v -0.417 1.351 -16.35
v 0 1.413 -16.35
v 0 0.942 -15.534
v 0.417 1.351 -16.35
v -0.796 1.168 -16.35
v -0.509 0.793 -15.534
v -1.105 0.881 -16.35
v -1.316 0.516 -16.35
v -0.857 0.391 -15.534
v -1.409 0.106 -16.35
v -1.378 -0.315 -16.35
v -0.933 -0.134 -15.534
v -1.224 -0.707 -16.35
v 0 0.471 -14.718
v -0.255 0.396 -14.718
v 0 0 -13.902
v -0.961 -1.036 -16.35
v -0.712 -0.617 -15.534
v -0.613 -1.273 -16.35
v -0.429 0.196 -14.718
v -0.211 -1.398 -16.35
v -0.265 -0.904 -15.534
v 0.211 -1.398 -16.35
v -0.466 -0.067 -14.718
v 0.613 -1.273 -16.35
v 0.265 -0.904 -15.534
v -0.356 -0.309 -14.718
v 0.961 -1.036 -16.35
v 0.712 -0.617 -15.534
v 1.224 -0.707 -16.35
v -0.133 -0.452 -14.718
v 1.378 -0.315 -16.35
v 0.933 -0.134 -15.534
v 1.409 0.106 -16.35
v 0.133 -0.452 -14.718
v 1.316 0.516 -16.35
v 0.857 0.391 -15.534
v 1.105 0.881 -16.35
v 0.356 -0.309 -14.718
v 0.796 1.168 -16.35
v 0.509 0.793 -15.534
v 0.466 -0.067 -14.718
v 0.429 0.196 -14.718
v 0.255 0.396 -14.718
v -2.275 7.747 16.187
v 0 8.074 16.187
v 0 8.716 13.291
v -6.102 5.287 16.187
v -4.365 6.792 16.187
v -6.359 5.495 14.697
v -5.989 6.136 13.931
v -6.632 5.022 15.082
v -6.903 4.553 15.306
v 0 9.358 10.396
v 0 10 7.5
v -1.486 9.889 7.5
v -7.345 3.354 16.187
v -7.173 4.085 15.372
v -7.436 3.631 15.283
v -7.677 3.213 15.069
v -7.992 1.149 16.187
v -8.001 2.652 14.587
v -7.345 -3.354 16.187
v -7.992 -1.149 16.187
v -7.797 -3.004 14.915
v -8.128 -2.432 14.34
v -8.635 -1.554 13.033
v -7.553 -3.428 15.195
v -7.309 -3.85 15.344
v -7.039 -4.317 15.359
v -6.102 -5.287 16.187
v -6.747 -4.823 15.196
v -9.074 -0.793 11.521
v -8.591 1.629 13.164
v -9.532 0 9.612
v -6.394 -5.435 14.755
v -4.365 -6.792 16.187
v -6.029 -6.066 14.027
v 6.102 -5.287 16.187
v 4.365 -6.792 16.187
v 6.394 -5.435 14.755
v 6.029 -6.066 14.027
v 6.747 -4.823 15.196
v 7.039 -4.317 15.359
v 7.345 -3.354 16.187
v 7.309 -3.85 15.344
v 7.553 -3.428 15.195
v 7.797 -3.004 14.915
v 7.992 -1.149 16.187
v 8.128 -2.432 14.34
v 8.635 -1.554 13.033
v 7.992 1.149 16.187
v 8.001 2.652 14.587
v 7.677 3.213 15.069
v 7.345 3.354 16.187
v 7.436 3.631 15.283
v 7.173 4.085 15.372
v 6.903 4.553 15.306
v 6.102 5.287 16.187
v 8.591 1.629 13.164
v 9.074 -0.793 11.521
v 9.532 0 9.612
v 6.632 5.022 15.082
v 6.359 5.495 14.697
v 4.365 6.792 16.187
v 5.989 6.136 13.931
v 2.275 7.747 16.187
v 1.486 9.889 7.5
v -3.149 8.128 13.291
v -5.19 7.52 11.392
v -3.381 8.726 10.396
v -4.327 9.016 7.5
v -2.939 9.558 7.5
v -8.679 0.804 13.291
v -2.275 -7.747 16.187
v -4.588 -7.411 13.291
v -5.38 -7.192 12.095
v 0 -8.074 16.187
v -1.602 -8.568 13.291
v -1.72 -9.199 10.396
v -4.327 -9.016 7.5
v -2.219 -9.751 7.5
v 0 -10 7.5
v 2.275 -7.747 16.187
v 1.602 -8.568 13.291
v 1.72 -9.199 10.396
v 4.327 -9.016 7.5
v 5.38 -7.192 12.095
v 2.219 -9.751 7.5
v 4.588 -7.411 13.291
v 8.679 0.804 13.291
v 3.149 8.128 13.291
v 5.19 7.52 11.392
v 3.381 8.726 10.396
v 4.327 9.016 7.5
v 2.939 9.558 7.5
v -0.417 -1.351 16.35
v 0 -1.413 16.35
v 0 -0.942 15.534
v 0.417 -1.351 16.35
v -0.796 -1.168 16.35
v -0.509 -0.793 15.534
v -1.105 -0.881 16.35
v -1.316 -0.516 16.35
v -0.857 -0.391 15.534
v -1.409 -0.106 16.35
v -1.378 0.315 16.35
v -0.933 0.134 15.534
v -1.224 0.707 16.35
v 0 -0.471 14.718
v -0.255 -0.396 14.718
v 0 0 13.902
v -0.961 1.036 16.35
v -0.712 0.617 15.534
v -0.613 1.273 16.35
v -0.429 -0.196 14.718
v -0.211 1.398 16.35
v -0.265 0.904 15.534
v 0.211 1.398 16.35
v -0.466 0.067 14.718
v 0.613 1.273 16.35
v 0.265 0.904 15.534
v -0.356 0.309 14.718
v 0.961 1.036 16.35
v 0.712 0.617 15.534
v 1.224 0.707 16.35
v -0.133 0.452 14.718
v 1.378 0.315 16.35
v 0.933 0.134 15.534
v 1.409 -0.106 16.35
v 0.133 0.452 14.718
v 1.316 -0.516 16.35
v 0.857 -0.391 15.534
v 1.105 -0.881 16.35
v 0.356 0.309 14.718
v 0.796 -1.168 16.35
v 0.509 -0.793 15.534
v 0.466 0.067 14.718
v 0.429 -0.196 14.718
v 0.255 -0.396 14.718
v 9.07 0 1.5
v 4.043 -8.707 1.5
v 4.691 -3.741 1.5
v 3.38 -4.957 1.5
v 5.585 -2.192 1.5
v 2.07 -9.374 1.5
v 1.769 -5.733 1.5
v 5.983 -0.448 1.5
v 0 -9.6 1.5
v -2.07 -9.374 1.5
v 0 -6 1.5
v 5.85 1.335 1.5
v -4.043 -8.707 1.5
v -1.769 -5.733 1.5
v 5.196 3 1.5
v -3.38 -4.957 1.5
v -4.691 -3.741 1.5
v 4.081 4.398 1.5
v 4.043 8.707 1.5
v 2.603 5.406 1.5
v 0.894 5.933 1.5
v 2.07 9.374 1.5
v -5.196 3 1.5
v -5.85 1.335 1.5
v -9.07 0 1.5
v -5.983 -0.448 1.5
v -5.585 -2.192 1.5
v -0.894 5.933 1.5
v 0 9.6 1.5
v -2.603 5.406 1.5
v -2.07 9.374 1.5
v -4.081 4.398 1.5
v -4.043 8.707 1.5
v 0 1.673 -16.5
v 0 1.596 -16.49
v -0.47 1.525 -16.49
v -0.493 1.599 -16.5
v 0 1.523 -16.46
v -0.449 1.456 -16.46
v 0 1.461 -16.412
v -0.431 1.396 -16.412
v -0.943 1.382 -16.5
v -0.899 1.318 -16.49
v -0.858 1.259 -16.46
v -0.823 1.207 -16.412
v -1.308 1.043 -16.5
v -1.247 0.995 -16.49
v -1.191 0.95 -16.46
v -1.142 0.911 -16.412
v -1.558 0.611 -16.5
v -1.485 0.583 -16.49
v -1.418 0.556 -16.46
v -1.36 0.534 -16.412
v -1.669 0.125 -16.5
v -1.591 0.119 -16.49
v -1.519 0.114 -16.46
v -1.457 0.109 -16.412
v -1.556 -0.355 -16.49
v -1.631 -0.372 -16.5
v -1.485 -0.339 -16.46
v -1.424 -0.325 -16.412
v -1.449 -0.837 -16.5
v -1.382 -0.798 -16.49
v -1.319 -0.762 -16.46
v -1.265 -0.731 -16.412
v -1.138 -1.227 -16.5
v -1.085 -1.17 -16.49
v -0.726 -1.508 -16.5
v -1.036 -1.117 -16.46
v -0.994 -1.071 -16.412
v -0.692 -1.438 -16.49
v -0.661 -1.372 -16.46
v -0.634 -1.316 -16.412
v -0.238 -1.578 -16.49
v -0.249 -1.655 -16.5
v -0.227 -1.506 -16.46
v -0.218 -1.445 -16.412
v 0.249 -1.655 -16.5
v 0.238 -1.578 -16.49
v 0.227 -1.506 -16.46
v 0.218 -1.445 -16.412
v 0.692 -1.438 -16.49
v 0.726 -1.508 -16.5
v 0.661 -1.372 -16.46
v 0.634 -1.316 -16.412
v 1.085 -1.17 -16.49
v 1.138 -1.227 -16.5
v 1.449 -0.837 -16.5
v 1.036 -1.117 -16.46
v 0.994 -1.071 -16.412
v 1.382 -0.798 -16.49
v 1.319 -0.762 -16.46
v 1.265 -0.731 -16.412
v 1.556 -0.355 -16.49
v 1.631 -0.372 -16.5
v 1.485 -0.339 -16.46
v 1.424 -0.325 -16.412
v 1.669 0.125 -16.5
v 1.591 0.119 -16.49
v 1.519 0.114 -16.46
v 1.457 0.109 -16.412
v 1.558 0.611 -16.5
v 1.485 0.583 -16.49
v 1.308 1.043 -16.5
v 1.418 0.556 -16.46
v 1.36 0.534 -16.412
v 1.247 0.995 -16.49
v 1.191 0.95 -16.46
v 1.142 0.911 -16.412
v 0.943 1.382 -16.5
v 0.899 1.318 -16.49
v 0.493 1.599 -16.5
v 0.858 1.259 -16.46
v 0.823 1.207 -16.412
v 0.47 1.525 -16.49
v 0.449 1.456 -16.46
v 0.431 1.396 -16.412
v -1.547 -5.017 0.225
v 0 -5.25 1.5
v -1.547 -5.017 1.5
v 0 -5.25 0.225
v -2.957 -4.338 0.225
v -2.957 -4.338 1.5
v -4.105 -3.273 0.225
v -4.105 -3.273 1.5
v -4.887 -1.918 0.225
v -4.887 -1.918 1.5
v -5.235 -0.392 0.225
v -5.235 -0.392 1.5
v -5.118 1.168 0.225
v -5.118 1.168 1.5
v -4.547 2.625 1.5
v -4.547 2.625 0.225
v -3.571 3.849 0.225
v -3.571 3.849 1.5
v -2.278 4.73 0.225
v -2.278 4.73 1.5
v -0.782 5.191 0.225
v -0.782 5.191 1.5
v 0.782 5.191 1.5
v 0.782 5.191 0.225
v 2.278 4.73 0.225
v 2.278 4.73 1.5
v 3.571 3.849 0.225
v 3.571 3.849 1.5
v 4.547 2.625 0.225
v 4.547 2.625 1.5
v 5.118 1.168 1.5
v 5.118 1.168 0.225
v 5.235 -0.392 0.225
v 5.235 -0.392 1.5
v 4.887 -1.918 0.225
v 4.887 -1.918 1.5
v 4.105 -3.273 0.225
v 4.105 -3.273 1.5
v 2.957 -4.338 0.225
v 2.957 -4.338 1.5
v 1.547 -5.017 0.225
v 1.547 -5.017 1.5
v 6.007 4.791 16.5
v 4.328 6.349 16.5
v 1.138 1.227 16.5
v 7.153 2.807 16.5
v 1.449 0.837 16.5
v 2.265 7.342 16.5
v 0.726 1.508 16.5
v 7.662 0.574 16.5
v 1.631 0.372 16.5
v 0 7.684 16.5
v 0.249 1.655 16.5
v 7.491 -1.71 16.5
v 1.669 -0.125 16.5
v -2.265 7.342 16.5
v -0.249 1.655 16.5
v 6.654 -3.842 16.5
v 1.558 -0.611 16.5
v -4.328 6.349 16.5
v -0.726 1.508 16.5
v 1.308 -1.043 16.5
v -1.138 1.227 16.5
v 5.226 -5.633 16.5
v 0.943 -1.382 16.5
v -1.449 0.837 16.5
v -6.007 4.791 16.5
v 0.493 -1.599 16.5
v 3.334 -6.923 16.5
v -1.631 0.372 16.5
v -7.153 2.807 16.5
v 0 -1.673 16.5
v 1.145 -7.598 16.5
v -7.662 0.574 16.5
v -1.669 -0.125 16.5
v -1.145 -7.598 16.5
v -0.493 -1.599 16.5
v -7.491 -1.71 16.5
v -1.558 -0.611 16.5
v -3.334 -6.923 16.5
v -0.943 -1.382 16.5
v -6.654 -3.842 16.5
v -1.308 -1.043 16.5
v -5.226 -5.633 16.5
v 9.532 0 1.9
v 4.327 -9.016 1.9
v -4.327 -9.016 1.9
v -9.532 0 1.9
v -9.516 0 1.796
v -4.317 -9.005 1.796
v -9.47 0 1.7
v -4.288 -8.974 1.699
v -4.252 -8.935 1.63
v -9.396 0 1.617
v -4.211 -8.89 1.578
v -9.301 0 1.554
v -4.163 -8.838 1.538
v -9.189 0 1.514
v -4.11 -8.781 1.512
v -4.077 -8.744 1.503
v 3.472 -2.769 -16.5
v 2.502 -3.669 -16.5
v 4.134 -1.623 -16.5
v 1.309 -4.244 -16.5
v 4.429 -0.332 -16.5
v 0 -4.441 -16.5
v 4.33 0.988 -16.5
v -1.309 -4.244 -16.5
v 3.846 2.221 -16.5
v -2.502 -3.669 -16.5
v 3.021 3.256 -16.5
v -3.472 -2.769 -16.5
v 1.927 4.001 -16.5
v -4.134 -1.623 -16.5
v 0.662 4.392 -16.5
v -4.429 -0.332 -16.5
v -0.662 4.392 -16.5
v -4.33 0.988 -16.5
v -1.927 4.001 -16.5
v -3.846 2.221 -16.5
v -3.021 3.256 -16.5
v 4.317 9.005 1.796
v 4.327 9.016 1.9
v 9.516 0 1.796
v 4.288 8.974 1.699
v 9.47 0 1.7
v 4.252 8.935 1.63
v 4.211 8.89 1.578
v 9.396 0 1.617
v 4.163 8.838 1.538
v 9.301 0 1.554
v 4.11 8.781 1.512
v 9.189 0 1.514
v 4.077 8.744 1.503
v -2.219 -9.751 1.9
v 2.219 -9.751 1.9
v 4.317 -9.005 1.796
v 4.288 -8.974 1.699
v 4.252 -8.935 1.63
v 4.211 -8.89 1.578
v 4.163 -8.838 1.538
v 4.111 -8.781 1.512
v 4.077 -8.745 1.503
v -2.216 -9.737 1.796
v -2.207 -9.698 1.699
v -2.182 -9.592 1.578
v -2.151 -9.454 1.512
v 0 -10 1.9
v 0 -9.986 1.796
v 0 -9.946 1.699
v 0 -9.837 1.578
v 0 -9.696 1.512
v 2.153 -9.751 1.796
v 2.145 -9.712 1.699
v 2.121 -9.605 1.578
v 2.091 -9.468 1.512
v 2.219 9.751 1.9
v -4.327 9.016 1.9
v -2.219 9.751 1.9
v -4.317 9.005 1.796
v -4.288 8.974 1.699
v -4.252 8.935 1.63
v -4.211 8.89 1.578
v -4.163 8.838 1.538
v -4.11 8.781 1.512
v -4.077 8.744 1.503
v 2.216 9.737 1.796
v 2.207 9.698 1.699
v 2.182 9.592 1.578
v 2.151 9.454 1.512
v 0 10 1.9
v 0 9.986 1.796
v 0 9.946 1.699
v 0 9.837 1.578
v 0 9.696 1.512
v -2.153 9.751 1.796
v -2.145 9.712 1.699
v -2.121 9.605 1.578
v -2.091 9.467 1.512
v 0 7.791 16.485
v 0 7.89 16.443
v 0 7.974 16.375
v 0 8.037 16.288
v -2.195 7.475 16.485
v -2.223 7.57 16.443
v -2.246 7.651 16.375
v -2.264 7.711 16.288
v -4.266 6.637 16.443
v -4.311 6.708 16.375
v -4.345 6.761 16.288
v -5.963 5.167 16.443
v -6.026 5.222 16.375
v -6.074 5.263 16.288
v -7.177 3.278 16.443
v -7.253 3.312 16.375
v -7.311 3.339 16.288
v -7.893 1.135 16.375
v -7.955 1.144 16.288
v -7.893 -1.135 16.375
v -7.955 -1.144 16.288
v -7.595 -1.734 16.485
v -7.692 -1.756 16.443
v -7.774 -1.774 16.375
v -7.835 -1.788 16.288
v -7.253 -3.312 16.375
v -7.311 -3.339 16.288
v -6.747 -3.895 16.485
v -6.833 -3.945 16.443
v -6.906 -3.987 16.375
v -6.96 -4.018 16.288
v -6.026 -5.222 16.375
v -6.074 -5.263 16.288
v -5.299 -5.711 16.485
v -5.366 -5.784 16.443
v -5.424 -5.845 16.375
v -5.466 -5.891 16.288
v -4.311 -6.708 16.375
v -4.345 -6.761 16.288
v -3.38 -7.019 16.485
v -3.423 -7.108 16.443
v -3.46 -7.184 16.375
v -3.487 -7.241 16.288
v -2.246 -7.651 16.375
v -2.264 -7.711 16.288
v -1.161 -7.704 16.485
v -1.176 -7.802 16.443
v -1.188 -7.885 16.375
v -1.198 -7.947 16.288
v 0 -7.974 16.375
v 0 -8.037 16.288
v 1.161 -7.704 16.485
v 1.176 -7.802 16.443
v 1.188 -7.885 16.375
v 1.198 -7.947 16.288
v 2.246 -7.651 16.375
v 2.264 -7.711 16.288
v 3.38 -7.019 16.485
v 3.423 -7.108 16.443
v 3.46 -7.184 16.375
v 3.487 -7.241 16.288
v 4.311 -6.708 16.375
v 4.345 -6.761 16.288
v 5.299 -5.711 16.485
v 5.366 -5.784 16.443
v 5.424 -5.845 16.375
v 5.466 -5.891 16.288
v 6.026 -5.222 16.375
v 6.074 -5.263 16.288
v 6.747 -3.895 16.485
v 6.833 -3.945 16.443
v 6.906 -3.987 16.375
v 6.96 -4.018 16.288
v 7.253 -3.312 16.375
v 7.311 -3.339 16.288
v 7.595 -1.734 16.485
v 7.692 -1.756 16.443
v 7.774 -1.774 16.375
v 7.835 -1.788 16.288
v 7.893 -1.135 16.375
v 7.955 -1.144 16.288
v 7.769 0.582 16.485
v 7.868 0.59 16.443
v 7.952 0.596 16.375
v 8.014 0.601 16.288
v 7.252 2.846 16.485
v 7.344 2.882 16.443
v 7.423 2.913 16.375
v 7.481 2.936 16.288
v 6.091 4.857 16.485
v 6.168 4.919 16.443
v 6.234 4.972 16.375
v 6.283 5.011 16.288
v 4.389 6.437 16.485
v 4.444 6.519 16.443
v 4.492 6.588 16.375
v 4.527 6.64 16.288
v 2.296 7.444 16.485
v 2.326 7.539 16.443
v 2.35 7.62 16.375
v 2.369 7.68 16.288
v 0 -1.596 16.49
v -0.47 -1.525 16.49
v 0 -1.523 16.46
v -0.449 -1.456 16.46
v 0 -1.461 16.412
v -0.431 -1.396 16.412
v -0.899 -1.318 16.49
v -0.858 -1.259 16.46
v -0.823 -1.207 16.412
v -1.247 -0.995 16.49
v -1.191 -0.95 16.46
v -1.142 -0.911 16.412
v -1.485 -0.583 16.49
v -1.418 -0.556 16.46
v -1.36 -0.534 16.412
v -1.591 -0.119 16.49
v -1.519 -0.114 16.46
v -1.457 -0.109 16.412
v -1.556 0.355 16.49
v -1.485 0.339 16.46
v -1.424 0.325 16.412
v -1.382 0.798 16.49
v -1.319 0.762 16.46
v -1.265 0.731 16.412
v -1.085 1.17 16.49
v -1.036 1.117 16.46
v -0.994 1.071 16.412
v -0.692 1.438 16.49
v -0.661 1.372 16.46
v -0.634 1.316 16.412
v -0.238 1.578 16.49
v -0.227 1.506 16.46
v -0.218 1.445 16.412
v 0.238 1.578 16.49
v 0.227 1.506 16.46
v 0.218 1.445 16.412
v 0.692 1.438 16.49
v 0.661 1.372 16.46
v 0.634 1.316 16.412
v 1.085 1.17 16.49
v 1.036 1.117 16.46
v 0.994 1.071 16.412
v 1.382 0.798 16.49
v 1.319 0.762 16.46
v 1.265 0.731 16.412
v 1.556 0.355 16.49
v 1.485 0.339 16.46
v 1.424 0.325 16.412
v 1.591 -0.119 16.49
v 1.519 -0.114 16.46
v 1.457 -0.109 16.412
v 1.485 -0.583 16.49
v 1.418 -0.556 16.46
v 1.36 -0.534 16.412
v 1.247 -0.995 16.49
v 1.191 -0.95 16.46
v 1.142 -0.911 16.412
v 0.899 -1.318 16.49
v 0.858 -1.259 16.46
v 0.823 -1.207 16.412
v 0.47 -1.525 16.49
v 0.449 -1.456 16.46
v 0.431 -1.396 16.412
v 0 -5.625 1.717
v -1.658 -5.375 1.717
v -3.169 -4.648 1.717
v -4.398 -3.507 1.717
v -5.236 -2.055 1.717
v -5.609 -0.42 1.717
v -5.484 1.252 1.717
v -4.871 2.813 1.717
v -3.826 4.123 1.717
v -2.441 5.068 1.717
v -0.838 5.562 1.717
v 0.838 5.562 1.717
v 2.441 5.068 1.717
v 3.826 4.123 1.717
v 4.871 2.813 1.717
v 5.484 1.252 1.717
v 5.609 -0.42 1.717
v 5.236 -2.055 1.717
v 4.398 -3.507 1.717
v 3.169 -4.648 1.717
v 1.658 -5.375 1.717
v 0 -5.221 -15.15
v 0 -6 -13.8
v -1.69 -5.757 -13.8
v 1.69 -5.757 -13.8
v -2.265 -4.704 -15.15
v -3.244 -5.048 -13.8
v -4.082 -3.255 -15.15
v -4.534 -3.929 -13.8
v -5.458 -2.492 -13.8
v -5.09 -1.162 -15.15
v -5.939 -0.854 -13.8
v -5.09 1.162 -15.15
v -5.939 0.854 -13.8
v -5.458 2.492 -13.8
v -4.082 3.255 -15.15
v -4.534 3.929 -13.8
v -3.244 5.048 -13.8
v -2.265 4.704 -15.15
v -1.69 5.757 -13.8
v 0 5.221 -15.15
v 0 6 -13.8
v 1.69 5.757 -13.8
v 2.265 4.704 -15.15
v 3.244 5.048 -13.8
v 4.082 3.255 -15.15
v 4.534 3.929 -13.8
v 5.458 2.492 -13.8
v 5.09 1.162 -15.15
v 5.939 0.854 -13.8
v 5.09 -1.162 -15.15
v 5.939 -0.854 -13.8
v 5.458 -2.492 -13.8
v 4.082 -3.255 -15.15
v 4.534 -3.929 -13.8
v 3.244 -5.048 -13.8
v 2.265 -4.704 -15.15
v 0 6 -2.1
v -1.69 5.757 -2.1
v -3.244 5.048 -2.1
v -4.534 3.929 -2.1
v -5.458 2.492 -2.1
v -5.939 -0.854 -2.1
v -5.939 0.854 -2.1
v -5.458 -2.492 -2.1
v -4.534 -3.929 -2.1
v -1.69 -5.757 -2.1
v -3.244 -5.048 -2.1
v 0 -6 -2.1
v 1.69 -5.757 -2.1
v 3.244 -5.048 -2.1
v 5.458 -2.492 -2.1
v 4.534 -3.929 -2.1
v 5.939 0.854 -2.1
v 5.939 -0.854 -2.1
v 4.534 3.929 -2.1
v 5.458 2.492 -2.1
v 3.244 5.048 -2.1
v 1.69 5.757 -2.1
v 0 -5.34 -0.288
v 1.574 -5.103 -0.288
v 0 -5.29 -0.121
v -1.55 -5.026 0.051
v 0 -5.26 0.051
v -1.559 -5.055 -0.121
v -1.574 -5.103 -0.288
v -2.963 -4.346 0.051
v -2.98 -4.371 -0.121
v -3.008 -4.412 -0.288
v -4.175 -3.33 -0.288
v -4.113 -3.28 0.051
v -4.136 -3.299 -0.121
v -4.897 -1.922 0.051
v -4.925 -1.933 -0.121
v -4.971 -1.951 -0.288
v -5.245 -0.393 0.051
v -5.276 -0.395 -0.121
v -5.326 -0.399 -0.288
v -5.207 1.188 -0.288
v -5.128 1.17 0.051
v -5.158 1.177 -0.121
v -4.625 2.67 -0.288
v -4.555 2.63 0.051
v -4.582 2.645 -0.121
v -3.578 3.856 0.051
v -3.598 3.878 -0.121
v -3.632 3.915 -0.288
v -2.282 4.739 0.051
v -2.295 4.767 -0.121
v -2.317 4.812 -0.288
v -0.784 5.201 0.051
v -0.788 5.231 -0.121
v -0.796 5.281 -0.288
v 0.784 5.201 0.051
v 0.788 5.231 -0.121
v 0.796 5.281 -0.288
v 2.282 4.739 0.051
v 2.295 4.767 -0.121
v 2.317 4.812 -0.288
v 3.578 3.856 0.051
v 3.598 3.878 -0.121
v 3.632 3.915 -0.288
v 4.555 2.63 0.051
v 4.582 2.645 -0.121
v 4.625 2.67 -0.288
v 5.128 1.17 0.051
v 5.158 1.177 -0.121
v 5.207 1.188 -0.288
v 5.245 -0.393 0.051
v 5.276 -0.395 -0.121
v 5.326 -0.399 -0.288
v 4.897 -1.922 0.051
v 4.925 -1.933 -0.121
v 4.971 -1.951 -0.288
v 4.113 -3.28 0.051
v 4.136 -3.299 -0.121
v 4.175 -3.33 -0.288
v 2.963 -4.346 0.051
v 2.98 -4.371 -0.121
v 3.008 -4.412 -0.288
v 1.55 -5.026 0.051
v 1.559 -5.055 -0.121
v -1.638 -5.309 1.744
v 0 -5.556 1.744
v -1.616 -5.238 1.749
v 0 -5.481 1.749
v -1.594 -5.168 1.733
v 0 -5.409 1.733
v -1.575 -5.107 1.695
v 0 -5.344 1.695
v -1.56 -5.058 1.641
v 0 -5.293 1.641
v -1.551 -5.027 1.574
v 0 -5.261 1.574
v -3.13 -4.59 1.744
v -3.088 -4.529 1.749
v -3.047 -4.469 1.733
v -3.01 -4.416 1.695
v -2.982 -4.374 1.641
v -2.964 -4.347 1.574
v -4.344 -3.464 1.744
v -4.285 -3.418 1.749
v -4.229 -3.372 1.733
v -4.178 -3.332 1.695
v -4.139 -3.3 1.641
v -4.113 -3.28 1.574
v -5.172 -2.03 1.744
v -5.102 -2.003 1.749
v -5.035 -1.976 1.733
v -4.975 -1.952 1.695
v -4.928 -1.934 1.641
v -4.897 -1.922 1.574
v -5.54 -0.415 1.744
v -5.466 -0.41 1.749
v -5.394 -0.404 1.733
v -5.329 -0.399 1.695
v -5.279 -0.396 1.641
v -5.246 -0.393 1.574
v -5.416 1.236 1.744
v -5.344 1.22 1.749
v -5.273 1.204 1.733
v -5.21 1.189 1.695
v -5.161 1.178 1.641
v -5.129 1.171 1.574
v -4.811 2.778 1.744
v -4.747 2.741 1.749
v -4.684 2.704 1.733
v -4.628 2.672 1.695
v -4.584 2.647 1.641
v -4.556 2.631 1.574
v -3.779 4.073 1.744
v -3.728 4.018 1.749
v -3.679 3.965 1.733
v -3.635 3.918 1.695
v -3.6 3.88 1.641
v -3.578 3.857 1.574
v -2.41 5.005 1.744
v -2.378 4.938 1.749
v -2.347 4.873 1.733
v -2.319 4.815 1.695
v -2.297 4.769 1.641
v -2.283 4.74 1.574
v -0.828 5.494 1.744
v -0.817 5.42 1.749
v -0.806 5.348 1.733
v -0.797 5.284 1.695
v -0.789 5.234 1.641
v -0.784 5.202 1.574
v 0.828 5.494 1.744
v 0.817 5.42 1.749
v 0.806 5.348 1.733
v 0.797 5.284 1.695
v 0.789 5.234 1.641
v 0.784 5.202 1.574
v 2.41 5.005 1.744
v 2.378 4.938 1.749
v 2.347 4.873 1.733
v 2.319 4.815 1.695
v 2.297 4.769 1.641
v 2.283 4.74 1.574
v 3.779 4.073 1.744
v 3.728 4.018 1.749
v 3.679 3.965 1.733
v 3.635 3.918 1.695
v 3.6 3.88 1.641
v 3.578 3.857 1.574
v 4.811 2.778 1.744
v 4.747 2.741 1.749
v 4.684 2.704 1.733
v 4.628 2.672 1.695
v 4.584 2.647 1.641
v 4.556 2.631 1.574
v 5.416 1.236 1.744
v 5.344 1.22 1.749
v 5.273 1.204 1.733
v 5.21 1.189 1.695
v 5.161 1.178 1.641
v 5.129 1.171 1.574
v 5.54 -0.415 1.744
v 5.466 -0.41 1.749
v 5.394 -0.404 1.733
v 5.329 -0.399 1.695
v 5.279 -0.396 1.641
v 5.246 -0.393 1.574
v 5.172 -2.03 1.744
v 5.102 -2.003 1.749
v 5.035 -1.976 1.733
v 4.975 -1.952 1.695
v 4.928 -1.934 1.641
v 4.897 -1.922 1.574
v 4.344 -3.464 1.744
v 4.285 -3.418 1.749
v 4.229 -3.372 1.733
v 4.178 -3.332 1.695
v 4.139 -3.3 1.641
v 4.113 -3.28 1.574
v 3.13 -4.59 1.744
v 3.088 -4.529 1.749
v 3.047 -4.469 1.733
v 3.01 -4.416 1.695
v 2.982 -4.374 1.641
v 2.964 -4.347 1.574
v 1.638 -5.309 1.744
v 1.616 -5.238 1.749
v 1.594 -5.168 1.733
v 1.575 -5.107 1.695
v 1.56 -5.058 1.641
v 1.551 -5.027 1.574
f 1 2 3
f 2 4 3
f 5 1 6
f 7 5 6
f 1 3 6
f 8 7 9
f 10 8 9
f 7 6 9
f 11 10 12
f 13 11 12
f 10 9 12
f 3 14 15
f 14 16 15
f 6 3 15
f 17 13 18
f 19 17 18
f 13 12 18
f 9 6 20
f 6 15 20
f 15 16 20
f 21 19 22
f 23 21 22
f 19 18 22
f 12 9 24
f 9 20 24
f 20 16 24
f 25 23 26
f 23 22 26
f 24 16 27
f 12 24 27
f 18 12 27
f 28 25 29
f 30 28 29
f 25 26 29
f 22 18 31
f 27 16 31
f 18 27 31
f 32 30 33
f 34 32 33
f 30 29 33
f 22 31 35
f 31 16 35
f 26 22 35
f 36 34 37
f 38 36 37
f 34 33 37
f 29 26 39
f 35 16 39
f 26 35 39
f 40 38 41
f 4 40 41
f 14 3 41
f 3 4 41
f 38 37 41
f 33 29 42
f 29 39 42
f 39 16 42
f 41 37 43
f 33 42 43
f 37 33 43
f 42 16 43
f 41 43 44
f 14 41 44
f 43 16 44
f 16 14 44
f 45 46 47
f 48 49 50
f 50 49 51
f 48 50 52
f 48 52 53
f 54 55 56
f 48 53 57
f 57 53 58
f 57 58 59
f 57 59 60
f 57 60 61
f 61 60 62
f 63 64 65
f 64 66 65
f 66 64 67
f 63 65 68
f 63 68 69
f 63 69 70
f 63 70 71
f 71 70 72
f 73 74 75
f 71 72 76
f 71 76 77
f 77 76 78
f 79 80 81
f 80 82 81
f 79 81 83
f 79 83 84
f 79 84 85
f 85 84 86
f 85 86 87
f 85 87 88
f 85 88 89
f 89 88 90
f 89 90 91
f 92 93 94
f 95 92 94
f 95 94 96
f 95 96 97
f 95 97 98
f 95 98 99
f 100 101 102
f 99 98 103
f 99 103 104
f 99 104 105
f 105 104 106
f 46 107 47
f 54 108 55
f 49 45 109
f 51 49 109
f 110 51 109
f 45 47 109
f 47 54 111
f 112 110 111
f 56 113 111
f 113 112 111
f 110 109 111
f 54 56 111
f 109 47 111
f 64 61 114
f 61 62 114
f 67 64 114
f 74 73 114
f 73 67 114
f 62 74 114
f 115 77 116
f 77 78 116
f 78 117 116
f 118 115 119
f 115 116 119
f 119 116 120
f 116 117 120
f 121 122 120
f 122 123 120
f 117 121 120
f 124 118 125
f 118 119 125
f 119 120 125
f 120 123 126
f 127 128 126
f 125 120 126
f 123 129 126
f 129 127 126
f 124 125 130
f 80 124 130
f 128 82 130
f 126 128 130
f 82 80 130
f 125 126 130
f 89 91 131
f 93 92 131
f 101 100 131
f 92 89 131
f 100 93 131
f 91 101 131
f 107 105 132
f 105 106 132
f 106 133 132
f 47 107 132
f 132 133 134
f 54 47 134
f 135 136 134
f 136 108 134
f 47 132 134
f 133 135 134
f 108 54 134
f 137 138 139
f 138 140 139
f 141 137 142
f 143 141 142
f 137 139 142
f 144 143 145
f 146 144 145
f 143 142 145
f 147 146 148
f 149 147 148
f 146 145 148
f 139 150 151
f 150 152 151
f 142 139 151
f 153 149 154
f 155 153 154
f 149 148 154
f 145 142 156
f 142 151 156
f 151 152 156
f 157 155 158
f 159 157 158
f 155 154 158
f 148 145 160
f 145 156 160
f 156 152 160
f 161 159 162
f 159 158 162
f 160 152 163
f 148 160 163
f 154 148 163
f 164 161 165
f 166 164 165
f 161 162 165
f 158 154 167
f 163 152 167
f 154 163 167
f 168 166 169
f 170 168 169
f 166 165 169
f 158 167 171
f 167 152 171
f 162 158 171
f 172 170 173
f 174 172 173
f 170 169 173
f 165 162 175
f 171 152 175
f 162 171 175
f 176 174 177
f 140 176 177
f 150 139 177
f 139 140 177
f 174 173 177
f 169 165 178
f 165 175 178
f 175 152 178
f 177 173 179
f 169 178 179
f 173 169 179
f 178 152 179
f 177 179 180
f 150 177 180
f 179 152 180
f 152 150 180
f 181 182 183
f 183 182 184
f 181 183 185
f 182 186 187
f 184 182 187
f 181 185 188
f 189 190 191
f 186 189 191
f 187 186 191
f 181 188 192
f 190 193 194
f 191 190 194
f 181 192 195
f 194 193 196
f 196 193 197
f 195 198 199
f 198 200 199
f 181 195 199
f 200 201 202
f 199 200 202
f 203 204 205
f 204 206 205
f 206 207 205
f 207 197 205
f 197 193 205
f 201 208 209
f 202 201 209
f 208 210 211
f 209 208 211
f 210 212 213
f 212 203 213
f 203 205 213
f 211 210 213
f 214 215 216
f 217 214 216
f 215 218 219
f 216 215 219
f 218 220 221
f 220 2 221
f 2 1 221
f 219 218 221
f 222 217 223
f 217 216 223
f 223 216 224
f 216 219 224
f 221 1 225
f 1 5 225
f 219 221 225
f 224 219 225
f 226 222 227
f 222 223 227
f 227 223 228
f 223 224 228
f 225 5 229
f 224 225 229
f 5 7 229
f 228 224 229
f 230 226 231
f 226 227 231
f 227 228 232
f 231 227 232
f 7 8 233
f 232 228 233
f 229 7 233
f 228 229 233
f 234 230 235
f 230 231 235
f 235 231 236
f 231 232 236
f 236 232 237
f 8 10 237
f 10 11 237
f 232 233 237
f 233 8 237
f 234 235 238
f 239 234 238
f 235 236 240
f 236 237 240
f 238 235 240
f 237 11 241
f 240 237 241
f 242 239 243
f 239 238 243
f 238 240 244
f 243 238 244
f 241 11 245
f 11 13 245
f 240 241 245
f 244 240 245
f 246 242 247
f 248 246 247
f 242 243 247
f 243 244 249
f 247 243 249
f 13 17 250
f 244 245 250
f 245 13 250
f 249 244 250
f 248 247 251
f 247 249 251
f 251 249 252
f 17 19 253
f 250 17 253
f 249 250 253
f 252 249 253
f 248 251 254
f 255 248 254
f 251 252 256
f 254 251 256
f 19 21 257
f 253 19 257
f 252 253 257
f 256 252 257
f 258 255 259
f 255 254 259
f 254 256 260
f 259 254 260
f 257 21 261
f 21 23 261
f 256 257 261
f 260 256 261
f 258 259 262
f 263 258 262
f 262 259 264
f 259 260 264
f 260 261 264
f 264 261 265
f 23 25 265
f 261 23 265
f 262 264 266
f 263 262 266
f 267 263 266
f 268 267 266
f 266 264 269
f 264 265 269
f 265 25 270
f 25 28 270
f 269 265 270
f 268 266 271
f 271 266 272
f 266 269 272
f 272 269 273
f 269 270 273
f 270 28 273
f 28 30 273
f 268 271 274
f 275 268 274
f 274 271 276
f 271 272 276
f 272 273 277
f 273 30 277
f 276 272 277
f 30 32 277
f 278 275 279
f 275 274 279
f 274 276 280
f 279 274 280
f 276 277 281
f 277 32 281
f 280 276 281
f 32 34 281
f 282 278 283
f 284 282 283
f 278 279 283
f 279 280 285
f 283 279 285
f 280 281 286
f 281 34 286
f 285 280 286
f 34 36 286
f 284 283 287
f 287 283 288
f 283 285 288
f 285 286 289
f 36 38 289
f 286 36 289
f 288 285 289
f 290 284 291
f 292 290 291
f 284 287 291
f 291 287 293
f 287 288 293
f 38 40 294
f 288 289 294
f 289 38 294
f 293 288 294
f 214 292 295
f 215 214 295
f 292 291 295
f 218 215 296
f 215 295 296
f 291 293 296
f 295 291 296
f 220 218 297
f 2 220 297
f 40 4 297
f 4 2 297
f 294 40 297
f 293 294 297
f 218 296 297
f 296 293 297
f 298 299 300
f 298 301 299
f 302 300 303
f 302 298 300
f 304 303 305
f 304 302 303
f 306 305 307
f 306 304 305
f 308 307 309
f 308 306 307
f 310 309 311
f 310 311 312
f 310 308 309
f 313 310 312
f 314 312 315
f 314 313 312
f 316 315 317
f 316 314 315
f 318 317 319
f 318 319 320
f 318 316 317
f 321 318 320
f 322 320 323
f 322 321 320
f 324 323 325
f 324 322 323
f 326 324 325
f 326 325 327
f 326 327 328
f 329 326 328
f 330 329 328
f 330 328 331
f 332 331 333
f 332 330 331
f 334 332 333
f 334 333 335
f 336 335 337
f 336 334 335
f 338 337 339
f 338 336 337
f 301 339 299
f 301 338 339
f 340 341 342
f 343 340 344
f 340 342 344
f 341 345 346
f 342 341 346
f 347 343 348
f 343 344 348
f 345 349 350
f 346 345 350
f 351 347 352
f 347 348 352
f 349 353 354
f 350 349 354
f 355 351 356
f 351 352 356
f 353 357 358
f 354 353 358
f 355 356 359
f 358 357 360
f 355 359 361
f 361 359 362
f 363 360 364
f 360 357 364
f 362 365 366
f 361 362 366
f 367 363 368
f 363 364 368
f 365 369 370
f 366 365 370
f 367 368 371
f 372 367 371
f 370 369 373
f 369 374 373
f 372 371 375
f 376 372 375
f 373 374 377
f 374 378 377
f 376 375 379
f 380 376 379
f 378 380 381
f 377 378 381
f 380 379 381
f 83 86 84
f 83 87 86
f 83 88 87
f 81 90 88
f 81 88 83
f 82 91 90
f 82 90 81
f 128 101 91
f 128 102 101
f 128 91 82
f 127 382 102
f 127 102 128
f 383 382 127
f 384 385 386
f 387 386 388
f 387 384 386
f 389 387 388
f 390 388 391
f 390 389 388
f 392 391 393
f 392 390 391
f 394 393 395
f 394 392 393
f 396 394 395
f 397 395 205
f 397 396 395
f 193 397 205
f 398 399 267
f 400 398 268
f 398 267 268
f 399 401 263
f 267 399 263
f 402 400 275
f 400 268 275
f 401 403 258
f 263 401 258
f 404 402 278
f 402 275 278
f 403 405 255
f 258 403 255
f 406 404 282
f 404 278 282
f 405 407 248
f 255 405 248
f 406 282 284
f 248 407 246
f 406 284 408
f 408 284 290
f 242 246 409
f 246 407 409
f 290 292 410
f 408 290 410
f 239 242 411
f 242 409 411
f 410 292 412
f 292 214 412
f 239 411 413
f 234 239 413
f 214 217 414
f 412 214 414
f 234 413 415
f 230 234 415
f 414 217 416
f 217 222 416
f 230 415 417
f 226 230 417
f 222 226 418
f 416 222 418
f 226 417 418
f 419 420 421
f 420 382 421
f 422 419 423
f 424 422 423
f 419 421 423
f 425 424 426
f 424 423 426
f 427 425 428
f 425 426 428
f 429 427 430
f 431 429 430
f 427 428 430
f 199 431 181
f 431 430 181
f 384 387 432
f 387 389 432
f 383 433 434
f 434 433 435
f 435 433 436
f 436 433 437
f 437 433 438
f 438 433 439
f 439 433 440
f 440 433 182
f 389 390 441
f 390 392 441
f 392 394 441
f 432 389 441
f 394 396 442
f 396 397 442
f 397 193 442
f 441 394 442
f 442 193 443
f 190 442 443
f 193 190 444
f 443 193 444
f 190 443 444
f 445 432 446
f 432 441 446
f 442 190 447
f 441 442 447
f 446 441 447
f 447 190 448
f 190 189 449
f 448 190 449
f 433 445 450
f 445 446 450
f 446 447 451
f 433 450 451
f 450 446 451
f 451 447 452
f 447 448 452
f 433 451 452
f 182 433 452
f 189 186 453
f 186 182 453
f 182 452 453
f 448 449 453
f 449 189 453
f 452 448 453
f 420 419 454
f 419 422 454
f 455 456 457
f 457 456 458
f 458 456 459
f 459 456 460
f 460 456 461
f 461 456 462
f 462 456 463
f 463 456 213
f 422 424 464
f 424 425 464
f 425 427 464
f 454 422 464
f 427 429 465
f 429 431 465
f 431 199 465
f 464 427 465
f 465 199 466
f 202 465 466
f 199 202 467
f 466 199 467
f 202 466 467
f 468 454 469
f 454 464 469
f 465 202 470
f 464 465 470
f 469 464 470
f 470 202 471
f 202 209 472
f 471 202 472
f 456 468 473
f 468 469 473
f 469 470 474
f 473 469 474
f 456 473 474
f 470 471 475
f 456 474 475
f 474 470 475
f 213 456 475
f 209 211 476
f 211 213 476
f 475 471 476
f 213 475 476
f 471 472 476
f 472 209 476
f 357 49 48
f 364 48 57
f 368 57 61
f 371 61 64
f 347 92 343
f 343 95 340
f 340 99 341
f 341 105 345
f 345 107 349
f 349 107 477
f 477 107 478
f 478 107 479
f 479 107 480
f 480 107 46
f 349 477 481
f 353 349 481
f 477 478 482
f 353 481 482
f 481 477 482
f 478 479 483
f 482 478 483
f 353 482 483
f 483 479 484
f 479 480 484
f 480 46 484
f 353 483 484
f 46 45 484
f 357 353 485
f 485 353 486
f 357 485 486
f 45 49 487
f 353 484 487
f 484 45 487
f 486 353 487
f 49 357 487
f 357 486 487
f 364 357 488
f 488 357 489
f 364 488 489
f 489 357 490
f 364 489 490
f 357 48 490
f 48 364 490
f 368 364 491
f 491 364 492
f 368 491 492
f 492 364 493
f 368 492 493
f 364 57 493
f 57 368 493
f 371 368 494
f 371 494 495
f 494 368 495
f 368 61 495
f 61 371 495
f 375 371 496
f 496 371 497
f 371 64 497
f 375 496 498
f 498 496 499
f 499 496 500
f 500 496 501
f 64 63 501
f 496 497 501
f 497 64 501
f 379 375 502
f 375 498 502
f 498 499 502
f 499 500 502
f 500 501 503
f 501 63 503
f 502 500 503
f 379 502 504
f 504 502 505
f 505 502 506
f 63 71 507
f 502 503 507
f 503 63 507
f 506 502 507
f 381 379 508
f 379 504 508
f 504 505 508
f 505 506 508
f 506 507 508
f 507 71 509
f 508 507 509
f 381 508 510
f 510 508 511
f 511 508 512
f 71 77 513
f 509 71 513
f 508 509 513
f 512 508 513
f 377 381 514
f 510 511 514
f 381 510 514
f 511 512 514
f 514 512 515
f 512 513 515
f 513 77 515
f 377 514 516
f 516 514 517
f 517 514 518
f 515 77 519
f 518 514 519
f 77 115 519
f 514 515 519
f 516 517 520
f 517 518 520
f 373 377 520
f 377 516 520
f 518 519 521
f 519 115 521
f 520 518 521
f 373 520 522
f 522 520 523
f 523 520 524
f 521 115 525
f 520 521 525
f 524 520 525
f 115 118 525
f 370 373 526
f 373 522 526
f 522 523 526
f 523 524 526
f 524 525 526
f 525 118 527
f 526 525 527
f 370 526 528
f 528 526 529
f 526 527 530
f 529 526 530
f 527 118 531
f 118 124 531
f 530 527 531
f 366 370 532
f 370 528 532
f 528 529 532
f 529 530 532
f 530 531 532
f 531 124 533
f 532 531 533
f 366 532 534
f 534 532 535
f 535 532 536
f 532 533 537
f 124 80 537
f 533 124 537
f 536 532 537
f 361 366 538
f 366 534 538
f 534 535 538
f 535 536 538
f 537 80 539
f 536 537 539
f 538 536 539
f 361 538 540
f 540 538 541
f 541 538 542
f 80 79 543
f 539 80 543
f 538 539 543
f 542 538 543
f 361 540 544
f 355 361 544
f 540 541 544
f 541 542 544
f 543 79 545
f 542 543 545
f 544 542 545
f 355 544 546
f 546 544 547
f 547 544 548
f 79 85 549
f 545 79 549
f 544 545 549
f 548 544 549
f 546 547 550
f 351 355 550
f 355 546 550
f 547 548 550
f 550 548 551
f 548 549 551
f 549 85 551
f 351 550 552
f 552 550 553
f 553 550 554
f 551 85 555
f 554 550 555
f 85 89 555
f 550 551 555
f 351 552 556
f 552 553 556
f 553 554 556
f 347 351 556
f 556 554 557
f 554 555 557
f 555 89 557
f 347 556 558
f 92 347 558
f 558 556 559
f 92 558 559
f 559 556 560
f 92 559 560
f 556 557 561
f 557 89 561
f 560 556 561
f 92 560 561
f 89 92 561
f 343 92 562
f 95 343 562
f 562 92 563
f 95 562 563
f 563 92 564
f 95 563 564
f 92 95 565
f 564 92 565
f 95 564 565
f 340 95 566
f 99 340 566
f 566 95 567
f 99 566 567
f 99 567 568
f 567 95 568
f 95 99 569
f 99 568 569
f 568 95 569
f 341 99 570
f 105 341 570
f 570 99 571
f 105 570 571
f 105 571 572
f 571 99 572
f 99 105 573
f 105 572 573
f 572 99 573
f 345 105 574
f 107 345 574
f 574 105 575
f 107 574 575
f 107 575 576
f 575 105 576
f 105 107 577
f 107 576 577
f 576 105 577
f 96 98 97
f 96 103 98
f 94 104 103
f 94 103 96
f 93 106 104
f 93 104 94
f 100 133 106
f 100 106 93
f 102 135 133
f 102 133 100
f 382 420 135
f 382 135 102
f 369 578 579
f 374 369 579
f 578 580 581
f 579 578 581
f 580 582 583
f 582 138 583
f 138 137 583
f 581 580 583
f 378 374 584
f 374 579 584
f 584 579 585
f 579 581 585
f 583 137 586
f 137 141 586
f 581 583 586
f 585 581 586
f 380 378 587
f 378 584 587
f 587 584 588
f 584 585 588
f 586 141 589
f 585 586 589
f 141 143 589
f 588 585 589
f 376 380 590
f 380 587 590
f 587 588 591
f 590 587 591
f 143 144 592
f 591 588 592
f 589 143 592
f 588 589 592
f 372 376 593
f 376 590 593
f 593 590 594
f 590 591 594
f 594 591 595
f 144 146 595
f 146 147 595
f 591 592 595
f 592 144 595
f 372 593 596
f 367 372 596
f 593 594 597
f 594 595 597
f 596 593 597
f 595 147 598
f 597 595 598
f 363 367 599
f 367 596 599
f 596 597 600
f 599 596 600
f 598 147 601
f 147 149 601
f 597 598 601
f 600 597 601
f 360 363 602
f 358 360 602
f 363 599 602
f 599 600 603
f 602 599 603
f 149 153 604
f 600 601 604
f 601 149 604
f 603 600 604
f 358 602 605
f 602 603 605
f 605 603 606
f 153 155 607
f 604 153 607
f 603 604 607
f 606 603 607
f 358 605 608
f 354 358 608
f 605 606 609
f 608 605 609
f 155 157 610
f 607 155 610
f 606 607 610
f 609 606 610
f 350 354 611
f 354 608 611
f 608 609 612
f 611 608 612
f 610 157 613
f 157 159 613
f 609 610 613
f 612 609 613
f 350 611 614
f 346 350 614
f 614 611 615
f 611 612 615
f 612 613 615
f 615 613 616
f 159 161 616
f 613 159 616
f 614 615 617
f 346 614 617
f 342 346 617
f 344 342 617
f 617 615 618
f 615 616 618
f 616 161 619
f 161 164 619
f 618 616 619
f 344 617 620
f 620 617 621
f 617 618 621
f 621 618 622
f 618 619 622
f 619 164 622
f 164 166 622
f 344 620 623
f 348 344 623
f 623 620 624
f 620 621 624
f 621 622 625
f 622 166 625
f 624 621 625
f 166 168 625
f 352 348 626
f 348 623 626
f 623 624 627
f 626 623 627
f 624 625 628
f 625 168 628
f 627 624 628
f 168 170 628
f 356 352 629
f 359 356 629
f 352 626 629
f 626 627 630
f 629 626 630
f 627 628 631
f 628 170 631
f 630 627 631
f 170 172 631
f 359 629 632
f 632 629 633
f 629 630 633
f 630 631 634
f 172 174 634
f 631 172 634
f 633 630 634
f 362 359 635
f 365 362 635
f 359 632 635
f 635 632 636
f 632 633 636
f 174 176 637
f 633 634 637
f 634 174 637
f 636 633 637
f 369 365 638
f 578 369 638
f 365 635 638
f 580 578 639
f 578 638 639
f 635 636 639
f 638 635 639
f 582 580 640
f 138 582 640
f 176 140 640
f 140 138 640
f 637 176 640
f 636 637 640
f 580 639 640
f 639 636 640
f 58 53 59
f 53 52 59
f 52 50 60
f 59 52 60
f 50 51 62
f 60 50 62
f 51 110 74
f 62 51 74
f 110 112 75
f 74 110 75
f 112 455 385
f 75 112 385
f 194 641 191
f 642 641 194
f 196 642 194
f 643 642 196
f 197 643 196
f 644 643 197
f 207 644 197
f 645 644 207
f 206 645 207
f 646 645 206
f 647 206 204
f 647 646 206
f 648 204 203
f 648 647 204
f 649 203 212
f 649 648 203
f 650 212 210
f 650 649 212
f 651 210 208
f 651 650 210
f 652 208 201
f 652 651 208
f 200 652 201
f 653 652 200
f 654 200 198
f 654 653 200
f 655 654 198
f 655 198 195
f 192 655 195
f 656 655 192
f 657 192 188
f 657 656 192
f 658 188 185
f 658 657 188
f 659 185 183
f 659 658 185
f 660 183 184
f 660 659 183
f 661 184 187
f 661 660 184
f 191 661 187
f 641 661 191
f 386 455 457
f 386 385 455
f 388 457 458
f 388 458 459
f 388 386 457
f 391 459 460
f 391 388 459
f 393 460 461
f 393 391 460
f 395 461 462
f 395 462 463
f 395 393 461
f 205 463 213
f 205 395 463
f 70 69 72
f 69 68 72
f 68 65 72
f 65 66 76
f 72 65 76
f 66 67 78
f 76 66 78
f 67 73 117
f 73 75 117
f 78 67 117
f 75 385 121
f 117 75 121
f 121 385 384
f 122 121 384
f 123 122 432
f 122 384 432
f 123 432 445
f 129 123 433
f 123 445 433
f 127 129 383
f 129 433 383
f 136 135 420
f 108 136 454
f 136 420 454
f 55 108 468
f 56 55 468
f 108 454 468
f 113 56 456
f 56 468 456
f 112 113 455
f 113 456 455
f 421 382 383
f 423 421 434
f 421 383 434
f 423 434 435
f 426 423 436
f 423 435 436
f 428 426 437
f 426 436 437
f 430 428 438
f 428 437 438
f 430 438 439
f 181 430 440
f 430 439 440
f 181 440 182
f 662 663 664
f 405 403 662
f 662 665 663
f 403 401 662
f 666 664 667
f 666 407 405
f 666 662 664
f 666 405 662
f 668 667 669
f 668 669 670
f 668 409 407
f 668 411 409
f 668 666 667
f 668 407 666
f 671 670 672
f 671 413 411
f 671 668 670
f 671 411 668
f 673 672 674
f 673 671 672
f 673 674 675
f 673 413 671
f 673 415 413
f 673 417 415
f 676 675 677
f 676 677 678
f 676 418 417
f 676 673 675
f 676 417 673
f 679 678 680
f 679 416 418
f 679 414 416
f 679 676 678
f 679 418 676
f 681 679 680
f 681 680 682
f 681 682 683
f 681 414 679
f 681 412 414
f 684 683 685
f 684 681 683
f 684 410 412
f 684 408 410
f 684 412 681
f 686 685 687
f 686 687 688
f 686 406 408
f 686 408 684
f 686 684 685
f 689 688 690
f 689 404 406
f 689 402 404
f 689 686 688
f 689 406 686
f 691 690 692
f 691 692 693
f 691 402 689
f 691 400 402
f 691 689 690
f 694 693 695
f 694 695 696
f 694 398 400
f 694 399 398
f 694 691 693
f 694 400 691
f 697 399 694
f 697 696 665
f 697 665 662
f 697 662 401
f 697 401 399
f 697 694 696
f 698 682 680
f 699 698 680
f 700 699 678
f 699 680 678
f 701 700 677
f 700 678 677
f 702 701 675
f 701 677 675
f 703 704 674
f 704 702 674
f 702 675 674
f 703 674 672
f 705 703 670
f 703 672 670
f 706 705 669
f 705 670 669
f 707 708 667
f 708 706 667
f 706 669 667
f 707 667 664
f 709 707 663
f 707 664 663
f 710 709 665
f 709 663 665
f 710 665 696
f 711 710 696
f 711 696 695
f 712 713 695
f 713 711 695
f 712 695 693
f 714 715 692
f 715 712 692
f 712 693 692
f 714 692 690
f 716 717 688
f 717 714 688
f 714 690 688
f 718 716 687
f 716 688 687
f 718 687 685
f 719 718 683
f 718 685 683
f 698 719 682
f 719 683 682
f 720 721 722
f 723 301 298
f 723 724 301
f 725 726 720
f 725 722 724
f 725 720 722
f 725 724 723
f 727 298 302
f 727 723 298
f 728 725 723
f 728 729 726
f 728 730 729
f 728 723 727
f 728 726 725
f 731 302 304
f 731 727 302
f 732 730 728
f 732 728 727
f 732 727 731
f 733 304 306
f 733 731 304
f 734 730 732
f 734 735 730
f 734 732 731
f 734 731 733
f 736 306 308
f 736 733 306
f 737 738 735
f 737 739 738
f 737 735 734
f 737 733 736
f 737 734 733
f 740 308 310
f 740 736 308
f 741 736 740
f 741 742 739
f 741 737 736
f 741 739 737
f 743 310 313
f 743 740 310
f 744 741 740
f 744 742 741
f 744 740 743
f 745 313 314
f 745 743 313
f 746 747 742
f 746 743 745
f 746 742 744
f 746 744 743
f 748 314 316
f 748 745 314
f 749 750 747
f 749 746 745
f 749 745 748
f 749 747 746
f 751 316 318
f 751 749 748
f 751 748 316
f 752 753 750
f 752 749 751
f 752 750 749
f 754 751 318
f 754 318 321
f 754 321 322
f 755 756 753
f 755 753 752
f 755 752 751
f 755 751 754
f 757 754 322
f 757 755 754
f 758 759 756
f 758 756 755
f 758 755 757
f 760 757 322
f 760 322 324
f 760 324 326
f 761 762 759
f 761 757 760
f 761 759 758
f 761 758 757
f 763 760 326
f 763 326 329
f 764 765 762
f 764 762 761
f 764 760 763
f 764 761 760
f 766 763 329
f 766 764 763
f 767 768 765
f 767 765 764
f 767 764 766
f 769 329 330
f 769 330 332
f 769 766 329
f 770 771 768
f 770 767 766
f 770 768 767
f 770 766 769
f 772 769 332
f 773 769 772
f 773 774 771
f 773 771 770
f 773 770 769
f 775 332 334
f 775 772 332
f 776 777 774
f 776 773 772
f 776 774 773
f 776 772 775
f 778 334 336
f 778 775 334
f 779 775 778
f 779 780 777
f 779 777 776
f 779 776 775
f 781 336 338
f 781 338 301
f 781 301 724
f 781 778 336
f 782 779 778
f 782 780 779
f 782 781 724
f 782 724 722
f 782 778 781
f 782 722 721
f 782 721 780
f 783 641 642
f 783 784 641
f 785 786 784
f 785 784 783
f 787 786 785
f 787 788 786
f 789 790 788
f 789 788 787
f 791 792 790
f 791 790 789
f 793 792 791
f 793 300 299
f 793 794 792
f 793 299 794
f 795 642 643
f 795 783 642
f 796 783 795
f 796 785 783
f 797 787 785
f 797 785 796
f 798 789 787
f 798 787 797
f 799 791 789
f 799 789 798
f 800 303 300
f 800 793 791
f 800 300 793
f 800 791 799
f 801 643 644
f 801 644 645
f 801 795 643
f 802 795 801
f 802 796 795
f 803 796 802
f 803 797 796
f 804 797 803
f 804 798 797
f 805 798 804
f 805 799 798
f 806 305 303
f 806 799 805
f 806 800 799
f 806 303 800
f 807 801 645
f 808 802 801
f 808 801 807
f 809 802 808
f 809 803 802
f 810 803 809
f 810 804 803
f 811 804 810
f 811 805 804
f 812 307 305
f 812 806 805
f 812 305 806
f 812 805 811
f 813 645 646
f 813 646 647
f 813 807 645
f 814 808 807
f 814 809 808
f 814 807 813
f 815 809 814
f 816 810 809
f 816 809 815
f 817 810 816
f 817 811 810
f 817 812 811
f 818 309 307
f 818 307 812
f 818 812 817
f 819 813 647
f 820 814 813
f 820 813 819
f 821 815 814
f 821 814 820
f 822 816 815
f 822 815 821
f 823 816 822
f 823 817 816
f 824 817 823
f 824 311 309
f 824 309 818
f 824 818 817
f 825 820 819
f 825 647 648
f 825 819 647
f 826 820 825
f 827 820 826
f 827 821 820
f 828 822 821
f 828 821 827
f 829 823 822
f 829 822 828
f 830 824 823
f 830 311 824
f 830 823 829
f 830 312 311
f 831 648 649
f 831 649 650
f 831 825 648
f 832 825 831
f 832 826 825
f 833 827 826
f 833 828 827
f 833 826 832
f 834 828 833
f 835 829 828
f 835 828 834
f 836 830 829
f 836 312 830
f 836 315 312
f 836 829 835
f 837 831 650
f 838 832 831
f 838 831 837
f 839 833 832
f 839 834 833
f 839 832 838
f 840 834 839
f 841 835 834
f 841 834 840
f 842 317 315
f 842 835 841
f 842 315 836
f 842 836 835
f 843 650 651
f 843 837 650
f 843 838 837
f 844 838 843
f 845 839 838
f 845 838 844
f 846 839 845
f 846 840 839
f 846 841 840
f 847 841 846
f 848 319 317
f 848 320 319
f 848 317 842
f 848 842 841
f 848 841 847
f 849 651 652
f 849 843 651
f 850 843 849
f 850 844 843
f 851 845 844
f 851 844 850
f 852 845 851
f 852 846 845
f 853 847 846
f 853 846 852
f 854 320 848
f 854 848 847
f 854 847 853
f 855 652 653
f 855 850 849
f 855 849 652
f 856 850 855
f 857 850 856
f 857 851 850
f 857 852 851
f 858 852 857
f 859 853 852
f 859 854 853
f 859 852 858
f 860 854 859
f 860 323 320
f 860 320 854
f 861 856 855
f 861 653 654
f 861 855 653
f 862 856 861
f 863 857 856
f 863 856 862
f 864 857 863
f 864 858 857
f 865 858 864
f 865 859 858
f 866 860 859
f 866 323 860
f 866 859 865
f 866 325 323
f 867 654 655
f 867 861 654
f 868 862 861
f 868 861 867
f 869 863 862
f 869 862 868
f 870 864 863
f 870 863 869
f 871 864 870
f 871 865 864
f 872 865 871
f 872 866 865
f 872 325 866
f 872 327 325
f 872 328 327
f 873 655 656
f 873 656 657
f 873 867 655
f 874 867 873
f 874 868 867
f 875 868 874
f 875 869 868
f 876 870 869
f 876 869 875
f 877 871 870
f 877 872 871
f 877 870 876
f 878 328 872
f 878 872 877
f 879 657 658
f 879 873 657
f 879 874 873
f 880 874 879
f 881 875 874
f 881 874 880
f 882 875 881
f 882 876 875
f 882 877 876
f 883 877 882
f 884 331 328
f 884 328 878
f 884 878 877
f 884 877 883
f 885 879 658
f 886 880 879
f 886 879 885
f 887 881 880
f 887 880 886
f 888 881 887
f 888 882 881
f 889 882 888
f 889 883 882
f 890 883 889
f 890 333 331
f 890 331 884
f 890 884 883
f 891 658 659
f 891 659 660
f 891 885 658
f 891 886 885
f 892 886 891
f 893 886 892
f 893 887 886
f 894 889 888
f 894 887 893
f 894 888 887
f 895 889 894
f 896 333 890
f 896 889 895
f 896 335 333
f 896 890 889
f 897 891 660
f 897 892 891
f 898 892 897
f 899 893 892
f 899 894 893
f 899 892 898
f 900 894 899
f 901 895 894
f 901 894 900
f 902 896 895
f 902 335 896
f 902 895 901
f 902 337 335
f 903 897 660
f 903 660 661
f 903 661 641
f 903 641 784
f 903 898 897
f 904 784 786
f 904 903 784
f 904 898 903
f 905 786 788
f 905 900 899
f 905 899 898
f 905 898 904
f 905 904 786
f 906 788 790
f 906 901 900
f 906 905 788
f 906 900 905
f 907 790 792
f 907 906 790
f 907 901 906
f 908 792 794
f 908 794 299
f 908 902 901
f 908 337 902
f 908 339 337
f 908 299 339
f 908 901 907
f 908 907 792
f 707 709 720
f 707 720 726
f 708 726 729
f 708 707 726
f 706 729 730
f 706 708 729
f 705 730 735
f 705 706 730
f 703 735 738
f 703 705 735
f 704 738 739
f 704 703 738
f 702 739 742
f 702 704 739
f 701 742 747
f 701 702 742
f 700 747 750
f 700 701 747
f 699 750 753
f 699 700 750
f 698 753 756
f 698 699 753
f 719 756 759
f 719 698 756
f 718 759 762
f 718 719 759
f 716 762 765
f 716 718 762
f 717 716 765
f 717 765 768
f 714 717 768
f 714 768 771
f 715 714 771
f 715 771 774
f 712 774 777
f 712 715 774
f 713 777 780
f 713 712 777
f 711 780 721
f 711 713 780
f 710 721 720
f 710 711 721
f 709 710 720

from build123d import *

# Parameters (mm, degrees)
CUT_EXTRUDE4_DEPTH = 23.891046285
FILLET1_R          = 0.4
FILLET2_R          = 0.4
FILLET3_R          = 0.3


with BuildPart() as part:
    # Sketch3 → Revolve2 (revolve)
    with BuildSketch(Plane(origin=(0, 0, 0), x_dir=(0, 0, -1), z_dir=(1, 0, 0))):
        Polygon((-16.5, 0), (-16.5, 8.004748036), (-7.5, 10), (-1.5, 10), (-1.5, 6), (16.5, 6), (16.5, 0), align=None)
    revolve(axis=Axis((0, 0, -16.5), (0, 0, 1)))

    # Sketch14 → Cut-Extrude4 (cut, through all)
    with BuildSketch(Plane(origin=(0, 0, 1.5), x_dir=(-1, 0, 0), z_dir=(0, 0, -1))):
        Polygon((-9.531762002, 0), (-4.326626661, -9.01555887), (0.878508679, -18.03111774), (-12.531762002, -18.03111774), (-12.531762002, 18.03111774), (0.878508679, 18.03111774), (-4.326626661, 9.01555887), align=None)
    cut_extrude4 = extrude(amount=-CUT_EXTRUDE4_DEPTH, mode=Mode.SUBTRACT)

    # Mirror1: Cut-Extrude4 across plane
    add(cut_extrude4.mirror(Plane(origin=(0, 0, 0), x_dir=(0, 0, 1), z_dir=(1, 0, 0))), mode=Mode.SUBTRACT)

    # Sketch16 → Cut-Revolve1 (revolve, cut)
    with BuildSketch(Plane(origin=(0, 0, 0), x_dir=(0, 0, -1), z_dir=(1, 0, 0)), mode=Mode.PRIVATE) as cut_revolve1_sk:
        with BuildLine():
            Line((-1.5, 6), (-1.716506351, 5.625))
            ThreePointArc((-1.716506351, 5.625), (-1.716506351, 5.375), (-1.5, 5.25))
            Line((-1.5, 5.25), (-0.225098536, 5.25))
            ThreePointArc((-0.225098536, 5.25), (0.035373731, 5.27278837), (0.287931679, 5.340461069))
            Line((0.287931679, 5.340461069), (2.1, 6))
            Line((2.1, 6), (-1.5, 6))
        make_face()
        Polygon((13.8, 6), (16.5, 4.441154273), (16.5, 6), align=None)
    revolve(cut_revolve1_sk.sketch.rotate(Axis((0, 0, 16.5), (0, 0, -1)), 180), axis=Axis((0, 0, 16.5), (0, 0, -1)), mode=Mode.SUBTRACT)

    # Cut-Extrude2 cone 1 section (through the dimple's axis) → Cut-Extrude2 (revolve, cut)
    with BuildSketch(Plane(origin=(0, 0, 16.5), x_dir=(0, -1, 0), z_dir=(1, 0, 0))):
        Polygon((0, 0), (1.5, 0), (0, 2.598076211), align=None)
    revolve(axis=Axis((0, 0, 16.5), (0, 0, -1)), mode=Mode.SUBTRACT)

    # Cut-Extrude5 cone 1 section (through the dimple's axis) → Cut-Extrude5 (revolve, cut)
    with BuildSketch(Plane(origin=(0, 0, -16.5), x_dir=(0, 1, 0), z_dir=(1, 0, 0))):
        Polygon((0, 0), (1.5, 0), (0, 2.598076211), align=None)
    revolve(axis=Axis((0, 0, -16.5), (0, 0, 1)), mode=Mode.SUBTRACT)

    # Fillet1
    fillet1_edges = [part.edges().sort_by_distance(p)[0] for p in [
        (0, -8.004748036, 16.5),
    ]]
    fillet(fillet1_edges, radius=FILLET1_R)

    # Fillet2
    fillet2_edges = [part.edges().sort_by_distance(p)[0] for p in [
        (0, -10, 1.5),
        (6.929194331, -4.507779435, 1.5),
        (6.929194331, 4.507779435, 1.5),
        (0, 10, 1.5),
        (-6.929194331, -4.507779435, 1.5),
        (-6.929194331, 4.507779435, 1.5),
    ]]
    fillet(fillet2_edges, radius=FILLET2_R)

    # Fillet3
    fillet3_edges = [part.edges().sort_by_distance(p)[0] for p in [
        (0, 1.5, 16.5),
        (0, -1.5, -16.5),
    ]]
    fillet(fillet3_edges, radius=FILLET3_R)


solid = part.part
